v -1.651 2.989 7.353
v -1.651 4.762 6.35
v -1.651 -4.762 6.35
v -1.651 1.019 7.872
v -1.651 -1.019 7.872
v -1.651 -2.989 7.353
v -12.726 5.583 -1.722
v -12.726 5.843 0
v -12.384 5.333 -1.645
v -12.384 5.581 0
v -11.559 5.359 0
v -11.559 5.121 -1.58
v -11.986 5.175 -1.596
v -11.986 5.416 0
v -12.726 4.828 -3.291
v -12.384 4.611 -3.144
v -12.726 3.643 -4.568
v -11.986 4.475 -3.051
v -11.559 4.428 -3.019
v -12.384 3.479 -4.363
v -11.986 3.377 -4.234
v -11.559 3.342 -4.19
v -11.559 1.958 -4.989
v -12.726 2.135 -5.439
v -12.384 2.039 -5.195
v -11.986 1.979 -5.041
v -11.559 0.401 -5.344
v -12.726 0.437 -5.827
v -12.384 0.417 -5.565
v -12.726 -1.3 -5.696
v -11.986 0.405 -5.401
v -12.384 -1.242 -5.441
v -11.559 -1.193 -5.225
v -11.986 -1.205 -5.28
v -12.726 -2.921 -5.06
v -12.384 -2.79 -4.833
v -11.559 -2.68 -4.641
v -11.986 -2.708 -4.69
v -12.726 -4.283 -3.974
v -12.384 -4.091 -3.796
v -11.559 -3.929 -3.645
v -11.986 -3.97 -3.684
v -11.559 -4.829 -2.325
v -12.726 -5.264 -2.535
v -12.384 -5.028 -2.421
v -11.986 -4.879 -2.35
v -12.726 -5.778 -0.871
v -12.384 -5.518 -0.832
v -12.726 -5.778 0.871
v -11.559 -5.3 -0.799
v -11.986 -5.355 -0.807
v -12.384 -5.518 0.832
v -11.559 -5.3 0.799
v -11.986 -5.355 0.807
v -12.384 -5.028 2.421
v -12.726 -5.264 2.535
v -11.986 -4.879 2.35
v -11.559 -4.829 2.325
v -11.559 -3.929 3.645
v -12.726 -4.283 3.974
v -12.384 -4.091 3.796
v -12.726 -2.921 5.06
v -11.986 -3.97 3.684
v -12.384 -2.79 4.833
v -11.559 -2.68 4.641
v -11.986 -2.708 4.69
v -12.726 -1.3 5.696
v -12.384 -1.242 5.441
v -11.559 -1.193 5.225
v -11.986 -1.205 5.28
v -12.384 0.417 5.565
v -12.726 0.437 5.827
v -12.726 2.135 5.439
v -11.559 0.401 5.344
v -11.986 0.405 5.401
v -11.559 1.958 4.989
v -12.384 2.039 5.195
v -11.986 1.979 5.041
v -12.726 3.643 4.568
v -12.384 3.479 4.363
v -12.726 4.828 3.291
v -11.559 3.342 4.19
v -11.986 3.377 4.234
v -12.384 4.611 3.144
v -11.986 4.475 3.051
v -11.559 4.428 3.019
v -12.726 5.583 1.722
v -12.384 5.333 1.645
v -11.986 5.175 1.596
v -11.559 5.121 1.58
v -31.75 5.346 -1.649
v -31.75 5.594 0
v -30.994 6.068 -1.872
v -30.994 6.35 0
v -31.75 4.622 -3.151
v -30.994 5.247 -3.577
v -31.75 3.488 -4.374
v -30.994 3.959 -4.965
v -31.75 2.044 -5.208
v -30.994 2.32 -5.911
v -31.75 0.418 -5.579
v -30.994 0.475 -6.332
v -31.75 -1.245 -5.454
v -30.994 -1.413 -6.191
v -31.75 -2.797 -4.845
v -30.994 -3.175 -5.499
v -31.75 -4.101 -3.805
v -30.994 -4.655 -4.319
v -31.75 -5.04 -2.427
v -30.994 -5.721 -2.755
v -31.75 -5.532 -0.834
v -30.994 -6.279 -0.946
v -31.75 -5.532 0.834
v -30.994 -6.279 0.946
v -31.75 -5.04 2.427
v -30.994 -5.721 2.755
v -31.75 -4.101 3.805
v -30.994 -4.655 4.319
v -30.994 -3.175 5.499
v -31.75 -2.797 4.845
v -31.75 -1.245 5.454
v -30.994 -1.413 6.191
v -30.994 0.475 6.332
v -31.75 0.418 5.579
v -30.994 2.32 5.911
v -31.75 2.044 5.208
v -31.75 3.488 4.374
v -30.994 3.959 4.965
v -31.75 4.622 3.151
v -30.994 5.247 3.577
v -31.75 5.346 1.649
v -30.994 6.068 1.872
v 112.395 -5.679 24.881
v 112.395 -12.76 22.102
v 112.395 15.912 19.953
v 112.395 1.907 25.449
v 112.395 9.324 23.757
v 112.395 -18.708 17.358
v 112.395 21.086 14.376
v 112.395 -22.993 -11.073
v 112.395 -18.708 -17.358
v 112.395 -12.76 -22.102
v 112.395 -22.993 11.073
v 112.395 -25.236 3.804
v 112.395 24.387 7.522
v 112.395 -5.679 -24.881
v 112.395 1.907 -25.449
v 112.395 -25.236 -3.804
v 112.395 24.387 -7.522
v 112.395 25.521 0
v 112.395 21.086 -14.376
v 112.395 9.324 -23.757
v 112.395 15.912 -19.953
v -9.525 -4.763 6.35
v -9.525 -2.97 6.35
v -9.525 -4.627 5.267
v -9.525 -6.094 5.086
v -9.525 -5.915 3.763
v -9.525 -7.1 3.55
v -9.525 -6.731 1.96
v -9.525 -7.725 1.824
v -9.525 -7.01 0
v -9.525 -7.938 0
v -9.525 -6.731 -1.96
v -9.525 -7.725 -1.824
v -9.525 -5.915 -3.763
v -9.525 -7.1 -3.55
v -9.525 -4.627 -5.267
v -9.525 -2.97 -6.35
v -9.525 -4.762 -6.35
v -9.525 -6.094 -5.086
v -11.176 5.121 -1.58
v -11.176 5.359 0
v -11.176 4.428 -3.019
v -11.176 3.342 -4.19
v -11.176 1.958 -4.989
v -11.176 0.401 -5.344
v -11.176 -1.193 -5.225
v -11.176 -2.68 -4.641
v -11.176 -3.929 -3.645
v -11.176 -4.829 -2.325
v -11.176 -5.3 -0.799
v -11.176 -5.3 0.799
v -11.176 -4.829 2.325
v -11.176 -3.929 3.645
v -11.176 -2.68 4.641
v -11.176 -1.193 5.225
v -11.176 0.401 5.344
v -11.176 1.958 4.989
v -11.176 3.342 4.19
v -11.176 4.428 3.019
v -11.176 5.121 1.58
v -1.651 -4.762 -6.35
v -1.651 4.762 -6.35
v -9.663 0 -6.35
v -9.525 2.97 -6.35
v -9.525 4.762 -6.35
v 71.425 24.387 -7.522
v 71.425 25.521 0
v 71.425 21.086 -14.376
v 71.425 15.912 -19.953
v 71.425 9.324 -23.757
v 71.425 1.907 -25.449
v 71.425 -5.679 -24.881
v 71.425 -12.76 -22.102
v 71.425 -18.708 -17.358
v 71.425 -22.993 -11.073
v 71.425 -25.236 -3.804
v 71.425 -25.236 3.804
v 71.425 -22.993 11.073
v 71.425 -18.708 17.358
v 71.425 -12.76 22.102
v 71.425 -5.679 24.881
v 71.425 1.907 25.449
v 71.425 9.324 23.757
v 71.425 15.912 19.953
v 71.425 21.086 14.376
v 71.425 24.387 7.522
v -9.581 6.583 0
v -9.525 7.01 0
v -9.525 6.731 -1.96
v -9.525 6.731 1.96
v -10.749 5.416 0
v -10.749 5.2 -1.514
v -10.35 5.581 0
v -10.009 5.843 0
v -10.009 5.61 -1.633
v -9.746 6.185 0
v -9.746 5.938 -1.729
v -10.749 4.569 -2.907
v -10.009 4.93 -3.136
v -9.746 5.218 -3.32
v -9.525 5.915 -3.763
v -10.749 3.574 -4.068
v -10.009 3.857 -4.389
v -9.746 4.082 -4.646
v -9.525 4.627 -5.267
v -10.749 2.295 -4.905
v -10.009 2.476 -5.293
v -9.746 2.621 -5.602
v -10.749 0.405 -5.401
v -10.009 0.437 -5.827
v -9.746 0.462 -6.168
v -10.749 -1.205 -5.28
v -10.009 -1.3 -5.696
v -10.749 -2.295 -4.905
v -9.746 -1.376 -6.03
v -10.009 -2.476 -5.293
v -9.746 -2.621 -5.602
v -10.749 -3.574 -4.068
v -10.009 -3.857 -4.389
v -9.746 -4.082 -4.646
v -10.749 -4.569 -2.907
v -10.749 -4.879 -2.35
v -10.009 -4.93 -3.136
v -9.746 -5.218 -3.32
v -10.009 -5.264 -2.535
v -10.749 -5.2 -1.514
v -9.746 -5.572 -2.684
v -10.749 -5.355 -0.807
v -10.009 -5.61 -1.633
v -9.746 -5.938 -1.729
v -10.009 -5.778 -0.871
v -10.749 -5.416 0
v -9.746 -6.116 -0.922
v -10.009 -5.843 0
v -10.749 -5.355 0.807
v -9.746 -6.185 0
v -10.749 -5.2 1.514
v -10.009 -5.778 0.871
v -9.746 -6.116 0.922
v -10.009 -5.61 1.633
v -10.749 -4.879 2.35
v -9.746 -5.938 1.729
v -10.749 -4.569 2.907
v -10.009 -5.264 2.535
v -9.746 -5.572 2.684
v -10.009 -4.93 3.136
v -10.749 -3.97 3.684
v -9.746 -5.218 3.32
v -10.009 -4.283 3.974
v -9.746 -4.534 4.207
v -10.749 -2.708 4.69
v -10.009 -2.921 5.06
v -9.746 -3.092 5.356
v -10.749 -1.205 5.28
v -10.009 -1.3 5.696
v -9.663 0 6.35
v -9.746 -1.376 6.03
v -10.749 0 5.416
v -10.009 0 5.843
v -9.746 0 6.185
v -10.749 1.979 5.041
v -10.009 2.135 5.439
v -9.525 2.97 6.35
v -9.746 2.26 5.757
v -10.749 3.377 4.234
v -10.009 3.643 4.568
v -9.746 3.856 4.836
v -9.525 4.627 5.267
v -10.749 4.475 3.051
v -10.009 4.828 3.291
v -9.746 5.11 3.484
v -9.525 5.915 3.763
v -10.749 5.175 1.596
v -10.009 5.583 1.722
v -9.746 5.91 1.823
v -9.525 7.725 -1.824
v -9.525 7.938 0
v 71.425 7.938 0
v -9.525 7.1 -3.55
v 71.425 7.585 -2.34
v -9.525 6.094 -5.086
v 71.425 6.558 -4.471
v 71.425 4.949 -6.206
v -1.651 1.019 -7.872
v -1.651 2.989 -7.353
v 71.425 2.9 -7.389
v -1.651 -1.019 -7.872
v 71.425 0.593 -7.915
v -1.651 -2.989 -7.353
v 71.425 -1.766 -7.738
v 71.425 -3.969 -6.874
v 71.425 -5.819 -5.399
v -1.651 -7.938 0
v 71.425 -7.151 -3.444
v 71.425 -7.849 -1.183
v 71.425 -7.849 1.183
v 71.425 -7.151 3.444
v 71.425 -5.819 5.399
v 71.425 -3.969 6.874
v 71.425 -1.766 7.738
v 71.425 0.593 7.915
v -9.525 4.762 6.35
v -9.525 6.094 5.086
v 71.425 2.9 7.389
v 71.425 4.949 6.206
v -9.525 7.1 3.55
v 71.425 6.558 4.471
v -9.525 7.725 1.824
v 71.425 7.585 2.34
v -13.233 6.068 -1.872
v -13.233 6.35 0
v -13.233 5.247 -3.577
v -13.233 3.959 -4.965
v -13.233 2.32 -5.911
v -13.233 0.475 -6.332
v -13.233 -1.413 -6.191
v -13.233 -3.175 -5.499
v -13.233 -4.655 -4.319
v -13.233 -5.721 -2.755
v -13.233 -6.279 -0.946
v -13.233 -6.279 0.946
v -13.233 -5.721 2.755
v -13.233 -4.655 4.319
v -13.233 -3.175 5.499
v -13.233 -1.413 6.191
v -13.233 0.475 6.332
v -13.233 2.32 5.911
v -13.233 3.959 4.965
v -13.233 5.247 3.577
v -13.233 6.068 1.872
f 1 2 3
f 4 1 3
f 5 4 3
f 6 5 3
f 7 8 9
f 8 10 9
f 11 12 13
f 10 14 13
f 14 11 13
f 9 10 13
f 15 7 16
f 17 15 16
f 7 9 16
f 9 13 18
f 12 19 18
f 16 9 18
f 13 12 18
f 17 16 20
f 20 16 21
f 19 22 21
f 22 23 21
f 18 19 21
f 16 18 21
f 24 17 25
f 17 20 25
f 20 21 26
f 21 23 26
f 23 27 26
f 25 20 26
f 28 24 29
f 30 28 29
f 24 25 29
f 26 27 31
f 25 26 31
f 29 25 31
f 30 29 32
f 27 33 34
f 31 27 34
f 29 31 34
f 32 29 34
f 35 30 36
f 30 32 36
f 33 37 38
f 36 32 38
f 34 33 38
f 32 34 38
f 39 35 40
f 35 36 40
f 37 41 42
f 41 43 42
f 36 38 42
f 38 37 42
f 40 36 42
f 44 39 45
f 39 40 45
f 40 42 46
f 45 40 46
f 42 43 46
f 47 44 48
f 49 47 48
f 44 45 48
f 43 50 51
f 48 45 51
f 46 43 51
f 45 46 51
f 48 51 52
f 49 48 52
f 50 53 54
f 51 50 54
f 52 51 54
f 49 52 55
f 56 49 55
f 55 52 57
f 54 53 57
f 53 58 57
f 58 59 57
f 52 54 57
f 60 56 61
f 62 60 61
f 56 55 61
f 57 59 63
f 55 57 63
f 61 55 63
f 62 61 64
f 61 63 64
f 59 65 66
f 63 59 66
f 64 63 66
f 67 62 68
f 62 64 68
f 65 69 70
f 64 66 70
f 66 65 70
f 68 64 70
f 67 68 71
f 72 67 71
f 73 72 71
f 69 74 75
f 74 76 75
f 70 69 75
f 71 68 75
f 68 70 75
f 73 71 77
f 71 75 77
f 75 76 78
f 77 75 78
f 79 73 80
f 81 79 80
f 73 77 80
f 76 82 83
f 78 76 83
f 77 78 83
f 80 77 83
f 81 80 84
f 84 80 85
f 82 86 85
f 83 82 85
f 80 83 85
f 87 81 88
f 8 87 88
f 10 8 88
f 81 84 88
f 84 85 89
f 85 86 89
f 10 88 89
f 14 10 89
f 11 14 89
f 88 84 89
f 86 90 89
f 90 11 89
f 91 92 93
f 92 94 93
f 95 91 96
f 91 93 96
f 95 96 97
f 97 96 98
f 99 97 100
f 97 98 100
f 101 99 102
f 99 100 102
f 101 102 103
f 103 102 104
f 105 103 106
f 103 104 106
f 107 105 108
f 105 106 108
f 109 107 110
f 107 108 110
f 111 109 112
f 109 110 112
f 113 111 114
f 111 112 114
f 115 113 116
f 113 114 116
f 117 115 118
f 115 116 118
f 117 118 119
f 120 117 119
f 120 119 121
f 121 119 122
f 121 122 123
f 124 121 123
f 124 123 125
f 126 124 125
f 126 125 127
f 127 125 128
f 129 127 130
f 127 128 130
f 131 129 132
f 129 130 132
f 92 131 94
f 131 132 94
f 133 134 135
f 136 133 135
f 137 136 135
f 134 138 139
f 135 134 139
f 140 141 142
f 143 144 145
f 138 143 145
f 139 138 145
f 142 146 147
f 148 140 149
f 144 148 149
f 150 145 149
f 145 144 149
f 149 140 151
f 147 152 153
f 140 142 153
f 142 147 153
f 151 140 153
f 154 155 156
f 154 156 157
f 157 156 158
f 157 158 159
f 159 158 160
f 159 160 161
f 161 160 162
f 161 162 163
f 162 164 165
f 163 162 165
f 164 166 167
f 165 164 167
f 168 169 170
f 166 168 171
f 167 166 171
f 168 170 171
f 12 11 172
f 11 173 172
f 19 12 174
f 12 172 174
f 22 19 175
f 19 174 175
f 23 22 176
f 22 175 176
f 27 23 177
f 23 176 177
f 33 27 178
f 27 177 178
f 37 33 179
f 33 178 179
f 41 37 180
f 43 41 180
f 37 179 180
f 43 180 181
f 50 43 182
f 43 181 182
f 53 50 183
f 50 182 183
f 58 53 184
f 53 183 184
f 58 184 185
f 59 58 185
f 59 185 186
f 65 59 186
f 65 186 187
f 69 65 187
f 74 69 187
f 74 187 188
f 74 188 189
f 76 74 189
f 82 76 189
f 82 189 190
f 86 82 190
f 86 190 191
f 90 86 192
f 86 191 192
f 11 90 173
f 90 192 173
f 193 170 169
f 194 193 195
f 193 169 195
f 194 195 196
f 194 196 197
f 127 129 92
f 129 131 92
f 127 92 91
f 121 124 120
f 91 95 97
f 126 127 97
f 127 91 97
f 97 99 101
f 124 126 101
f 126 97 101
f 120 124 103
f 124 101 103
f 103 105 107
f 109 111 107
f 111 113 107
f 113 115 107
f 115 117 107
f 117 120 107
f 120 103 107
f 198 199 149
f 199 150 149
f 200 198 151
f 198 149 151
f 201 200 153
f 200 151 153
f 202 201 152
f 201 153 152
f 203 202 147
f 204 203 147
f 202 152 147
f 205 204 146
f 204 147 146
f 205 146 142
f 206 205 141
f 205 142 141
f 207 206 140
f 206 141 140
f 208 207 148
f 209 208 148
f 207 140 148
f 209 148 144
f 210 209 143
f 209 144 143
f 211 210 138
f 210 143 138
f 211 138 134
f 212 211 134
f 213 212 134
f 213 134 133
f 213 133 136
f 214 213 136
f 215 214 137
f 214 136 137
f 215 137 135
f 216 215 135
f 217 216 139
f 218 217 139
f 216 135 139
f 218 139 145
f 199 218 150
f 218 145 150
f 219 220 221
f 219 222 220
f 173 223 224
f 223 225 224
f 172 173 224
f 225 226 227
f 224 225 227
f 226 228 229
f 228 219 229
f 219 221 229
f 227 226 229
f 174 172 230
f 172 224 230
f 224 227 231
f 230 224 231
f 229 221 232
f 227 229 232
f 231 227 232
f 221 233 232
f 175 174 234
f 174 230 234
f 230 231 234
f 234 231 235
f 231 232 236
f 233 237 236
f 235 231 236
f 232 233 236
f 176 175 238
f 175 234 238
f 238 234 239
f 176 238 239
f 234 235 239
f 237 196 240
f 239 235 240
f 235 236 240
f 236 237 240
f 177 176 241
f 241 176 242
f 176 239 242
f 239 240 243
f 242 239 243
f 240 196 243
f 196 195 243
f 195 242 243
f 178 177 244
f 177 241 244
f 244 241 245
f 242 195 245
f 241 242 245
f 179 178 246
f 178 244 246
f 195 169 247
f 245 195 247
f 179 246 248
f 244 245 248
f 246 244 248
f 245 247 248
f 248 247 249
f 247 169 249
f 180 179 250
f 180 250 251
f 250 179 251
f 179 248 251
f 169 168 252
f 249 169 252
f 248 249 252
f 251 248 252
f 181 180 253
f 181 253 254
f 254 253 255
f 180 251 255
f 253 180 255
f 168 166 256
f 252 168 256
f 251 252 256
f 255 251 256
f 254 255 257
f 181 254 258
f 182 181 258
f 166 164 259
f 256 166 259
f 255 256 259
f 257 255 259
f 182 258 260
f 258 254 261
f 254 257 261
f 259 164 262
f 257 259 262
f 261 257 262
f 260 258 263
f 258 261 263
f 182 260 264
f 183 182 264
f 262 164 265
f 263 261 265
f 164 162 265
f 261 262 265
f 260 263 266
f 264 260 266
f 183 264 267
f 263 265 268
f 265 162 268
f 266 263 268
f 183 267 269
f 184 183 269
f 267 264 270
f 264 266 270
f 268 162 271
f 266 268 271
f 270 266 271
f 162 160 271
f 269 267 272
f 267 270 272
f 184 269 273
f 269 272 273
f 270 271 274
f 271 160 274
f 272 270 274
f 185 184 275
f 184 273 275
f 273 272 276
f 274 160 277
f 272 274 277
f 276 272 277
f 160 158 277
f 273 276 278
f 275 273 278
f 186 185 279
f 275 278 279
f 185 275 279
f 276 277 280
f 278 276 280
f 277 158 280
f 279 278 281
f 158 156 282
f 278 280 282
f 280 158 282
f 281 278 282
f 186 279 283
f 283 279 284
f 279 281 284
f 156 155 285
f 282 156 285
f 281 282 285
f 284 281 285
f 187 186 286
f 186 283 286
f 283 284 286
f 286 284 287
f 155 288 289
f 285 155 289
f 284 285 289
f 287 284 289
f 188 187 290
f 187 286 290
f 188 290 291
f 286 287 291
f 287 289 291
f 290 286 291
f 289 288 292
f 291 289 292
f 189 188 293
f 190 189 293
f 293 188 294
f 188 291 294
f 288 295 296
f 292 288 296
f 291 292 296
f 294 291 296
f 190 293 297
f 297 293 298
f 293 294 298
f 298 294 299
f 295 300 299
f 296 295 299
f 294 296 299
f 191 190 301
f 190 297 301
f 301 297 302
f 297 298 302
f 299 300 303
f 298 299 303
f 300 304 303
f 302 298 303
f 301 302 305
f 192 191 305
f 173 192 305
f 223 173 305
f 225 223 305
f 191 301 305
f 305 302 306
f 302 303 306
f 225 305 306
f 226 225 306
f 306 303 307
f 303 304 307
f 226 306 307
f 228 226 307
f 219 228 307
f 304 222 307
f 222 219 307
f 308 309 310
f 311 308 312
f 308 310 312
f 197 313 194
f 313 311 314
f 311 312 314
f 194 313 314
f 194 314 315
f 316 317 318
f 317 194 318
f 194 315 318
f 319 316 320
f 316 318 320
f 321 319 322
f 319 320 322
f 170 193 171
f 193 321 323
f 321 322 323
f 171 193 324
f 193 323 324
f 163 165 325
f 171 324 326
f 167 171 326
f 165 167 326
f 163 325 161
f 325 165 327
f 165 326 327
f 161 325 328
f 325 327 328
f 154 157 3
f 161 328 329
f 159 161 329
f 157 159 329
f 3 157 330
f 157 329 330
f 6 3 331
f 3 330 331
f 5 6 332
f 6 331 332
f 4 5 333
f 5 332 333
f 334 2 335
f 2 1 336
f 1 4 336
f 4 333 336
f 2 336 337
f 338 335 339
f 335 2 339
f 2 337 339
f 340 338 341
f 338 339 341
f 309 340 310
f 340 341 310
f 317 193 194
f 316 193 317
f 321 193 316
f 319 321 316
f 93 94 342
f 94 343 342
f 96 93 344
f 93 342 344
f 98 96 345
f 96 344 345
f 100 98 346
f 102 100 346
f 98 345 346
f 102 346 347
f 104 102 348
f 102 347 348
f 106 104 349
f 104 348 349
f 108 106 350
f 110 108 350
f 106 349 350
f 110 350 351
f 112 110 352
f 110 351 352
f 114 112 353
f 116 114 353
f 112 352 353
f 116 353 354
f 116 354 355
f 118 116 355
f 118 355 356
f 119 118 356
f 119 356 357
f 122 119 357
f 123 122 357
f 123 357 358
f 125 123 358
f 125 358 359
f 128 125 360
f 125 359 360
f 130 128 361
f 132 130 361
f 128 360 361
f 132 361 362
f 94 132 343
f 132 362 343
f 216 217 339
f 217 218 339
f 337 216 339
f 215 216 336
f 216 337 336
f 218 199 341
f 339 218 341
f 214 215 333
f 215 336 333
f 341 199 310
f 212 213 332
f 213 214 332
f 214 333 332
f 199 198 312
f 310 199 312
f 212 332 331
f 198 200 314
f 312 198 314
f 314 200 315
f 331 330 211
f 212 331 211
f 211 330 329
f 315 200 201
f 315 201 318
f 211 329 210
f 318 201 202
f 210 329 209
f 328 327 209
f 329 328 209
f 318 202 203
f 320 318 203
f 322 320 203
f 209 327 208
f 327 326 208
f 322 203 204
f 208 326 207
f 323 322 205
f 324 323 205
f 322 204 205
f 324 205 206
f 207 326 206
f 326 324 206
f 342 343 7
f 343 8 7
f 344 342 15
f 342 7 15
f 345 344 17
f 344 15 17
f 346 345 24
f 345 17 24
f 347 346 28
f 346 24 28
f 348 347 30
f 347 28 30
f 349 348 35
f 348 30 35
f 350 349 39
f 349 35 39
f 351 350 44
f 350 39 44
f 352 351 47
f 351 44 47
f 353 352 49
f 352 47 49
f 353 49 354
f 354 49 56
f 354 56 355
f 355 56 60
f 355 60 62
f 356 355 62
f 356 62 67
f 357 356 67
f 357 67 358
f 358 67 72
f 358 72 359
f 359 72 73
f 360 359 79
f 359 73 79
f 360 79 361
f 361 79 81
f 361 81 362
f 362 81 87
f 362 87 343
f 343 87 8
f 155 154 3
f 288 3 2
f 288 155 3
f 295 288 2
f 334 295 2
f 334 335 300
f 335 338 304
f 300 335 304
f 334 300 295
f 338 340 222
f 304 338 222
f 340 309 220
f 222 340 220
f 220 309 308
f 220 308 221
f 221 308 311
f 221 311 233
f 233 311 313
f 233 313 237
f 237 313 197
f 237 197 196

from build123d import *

# Parameters (mm, degrees)
SKETCH3_W          = 31.75
SKETCH3_H          = 31.75
SKETCH3_W_2        = 12.7
SKETCH3_H_2        = 15.875
CUT_EXTRUDE1_DEPTH = 8.509


with BuildPart() as part:
    # Sketch1 → Revolve1 (revolve)
    with BuildSketch(Plane.XY):
        Polygon((-9.525, 0), (-9.525, 7.9375), (71.4248, 7.9375), (71.4248, 25.52065), (112.395, 25.52065), (112.395, 0), align=None)
    revolve(axis=Axis((112.395, 0, 0), (-1, 0, 0)))

    # Sketch2 → Revolve2 (revolve)
    with BuildSketch(Plane.XY):
        with BuildLine():
            Line((-31.75, 0), (-31.75, 5.59435))
            Line((-31.75, 5.59435), (-30.99435, 6.35))
            Line((-30.99435, 6.35), (-13.2334, 6.35))
            Line((-13.2334, 6.35), (-12.726366704, 5.842966704))
            ThreePointArc((-12.726366704, 5.842966704), (-12.190743755, 5.485074892), (-11.558933409, 5.3594))
            Line((-11.558933409, 5.3594), (-11.176, 5.3594))
            ThreePointArc((-11.176, 5.3594), (-10.008566704, 5.842966704), (-9.525, 7.0104))
            Line((-9.525, 7.0104), (-9.525, 0))
            Line((-9.525, 0), (-31.75, 0))
        make_face()
    revolve(axis=Axis((-9.525, 0, 0), (-1, 0, 0)))

    # Sketch3 → Cut-Extrude1 (cut)
    with BuildSketch(Plane(origin=(-10.16, 0, 0), x_dir=(0, 0, -1), z_dir=(1, 0, 0))):
        Rectangle(SKETCH3_W, SKETCH3_H)
        Rectangle(SKETCH3_W_2, SKETCH3_H_2, mode=Mode.SUBTRACT)
    extrude(amount=CUT_EXTRUDE1_DEPTH, mode=Mode.SUBTRACT)


solid = part.part
